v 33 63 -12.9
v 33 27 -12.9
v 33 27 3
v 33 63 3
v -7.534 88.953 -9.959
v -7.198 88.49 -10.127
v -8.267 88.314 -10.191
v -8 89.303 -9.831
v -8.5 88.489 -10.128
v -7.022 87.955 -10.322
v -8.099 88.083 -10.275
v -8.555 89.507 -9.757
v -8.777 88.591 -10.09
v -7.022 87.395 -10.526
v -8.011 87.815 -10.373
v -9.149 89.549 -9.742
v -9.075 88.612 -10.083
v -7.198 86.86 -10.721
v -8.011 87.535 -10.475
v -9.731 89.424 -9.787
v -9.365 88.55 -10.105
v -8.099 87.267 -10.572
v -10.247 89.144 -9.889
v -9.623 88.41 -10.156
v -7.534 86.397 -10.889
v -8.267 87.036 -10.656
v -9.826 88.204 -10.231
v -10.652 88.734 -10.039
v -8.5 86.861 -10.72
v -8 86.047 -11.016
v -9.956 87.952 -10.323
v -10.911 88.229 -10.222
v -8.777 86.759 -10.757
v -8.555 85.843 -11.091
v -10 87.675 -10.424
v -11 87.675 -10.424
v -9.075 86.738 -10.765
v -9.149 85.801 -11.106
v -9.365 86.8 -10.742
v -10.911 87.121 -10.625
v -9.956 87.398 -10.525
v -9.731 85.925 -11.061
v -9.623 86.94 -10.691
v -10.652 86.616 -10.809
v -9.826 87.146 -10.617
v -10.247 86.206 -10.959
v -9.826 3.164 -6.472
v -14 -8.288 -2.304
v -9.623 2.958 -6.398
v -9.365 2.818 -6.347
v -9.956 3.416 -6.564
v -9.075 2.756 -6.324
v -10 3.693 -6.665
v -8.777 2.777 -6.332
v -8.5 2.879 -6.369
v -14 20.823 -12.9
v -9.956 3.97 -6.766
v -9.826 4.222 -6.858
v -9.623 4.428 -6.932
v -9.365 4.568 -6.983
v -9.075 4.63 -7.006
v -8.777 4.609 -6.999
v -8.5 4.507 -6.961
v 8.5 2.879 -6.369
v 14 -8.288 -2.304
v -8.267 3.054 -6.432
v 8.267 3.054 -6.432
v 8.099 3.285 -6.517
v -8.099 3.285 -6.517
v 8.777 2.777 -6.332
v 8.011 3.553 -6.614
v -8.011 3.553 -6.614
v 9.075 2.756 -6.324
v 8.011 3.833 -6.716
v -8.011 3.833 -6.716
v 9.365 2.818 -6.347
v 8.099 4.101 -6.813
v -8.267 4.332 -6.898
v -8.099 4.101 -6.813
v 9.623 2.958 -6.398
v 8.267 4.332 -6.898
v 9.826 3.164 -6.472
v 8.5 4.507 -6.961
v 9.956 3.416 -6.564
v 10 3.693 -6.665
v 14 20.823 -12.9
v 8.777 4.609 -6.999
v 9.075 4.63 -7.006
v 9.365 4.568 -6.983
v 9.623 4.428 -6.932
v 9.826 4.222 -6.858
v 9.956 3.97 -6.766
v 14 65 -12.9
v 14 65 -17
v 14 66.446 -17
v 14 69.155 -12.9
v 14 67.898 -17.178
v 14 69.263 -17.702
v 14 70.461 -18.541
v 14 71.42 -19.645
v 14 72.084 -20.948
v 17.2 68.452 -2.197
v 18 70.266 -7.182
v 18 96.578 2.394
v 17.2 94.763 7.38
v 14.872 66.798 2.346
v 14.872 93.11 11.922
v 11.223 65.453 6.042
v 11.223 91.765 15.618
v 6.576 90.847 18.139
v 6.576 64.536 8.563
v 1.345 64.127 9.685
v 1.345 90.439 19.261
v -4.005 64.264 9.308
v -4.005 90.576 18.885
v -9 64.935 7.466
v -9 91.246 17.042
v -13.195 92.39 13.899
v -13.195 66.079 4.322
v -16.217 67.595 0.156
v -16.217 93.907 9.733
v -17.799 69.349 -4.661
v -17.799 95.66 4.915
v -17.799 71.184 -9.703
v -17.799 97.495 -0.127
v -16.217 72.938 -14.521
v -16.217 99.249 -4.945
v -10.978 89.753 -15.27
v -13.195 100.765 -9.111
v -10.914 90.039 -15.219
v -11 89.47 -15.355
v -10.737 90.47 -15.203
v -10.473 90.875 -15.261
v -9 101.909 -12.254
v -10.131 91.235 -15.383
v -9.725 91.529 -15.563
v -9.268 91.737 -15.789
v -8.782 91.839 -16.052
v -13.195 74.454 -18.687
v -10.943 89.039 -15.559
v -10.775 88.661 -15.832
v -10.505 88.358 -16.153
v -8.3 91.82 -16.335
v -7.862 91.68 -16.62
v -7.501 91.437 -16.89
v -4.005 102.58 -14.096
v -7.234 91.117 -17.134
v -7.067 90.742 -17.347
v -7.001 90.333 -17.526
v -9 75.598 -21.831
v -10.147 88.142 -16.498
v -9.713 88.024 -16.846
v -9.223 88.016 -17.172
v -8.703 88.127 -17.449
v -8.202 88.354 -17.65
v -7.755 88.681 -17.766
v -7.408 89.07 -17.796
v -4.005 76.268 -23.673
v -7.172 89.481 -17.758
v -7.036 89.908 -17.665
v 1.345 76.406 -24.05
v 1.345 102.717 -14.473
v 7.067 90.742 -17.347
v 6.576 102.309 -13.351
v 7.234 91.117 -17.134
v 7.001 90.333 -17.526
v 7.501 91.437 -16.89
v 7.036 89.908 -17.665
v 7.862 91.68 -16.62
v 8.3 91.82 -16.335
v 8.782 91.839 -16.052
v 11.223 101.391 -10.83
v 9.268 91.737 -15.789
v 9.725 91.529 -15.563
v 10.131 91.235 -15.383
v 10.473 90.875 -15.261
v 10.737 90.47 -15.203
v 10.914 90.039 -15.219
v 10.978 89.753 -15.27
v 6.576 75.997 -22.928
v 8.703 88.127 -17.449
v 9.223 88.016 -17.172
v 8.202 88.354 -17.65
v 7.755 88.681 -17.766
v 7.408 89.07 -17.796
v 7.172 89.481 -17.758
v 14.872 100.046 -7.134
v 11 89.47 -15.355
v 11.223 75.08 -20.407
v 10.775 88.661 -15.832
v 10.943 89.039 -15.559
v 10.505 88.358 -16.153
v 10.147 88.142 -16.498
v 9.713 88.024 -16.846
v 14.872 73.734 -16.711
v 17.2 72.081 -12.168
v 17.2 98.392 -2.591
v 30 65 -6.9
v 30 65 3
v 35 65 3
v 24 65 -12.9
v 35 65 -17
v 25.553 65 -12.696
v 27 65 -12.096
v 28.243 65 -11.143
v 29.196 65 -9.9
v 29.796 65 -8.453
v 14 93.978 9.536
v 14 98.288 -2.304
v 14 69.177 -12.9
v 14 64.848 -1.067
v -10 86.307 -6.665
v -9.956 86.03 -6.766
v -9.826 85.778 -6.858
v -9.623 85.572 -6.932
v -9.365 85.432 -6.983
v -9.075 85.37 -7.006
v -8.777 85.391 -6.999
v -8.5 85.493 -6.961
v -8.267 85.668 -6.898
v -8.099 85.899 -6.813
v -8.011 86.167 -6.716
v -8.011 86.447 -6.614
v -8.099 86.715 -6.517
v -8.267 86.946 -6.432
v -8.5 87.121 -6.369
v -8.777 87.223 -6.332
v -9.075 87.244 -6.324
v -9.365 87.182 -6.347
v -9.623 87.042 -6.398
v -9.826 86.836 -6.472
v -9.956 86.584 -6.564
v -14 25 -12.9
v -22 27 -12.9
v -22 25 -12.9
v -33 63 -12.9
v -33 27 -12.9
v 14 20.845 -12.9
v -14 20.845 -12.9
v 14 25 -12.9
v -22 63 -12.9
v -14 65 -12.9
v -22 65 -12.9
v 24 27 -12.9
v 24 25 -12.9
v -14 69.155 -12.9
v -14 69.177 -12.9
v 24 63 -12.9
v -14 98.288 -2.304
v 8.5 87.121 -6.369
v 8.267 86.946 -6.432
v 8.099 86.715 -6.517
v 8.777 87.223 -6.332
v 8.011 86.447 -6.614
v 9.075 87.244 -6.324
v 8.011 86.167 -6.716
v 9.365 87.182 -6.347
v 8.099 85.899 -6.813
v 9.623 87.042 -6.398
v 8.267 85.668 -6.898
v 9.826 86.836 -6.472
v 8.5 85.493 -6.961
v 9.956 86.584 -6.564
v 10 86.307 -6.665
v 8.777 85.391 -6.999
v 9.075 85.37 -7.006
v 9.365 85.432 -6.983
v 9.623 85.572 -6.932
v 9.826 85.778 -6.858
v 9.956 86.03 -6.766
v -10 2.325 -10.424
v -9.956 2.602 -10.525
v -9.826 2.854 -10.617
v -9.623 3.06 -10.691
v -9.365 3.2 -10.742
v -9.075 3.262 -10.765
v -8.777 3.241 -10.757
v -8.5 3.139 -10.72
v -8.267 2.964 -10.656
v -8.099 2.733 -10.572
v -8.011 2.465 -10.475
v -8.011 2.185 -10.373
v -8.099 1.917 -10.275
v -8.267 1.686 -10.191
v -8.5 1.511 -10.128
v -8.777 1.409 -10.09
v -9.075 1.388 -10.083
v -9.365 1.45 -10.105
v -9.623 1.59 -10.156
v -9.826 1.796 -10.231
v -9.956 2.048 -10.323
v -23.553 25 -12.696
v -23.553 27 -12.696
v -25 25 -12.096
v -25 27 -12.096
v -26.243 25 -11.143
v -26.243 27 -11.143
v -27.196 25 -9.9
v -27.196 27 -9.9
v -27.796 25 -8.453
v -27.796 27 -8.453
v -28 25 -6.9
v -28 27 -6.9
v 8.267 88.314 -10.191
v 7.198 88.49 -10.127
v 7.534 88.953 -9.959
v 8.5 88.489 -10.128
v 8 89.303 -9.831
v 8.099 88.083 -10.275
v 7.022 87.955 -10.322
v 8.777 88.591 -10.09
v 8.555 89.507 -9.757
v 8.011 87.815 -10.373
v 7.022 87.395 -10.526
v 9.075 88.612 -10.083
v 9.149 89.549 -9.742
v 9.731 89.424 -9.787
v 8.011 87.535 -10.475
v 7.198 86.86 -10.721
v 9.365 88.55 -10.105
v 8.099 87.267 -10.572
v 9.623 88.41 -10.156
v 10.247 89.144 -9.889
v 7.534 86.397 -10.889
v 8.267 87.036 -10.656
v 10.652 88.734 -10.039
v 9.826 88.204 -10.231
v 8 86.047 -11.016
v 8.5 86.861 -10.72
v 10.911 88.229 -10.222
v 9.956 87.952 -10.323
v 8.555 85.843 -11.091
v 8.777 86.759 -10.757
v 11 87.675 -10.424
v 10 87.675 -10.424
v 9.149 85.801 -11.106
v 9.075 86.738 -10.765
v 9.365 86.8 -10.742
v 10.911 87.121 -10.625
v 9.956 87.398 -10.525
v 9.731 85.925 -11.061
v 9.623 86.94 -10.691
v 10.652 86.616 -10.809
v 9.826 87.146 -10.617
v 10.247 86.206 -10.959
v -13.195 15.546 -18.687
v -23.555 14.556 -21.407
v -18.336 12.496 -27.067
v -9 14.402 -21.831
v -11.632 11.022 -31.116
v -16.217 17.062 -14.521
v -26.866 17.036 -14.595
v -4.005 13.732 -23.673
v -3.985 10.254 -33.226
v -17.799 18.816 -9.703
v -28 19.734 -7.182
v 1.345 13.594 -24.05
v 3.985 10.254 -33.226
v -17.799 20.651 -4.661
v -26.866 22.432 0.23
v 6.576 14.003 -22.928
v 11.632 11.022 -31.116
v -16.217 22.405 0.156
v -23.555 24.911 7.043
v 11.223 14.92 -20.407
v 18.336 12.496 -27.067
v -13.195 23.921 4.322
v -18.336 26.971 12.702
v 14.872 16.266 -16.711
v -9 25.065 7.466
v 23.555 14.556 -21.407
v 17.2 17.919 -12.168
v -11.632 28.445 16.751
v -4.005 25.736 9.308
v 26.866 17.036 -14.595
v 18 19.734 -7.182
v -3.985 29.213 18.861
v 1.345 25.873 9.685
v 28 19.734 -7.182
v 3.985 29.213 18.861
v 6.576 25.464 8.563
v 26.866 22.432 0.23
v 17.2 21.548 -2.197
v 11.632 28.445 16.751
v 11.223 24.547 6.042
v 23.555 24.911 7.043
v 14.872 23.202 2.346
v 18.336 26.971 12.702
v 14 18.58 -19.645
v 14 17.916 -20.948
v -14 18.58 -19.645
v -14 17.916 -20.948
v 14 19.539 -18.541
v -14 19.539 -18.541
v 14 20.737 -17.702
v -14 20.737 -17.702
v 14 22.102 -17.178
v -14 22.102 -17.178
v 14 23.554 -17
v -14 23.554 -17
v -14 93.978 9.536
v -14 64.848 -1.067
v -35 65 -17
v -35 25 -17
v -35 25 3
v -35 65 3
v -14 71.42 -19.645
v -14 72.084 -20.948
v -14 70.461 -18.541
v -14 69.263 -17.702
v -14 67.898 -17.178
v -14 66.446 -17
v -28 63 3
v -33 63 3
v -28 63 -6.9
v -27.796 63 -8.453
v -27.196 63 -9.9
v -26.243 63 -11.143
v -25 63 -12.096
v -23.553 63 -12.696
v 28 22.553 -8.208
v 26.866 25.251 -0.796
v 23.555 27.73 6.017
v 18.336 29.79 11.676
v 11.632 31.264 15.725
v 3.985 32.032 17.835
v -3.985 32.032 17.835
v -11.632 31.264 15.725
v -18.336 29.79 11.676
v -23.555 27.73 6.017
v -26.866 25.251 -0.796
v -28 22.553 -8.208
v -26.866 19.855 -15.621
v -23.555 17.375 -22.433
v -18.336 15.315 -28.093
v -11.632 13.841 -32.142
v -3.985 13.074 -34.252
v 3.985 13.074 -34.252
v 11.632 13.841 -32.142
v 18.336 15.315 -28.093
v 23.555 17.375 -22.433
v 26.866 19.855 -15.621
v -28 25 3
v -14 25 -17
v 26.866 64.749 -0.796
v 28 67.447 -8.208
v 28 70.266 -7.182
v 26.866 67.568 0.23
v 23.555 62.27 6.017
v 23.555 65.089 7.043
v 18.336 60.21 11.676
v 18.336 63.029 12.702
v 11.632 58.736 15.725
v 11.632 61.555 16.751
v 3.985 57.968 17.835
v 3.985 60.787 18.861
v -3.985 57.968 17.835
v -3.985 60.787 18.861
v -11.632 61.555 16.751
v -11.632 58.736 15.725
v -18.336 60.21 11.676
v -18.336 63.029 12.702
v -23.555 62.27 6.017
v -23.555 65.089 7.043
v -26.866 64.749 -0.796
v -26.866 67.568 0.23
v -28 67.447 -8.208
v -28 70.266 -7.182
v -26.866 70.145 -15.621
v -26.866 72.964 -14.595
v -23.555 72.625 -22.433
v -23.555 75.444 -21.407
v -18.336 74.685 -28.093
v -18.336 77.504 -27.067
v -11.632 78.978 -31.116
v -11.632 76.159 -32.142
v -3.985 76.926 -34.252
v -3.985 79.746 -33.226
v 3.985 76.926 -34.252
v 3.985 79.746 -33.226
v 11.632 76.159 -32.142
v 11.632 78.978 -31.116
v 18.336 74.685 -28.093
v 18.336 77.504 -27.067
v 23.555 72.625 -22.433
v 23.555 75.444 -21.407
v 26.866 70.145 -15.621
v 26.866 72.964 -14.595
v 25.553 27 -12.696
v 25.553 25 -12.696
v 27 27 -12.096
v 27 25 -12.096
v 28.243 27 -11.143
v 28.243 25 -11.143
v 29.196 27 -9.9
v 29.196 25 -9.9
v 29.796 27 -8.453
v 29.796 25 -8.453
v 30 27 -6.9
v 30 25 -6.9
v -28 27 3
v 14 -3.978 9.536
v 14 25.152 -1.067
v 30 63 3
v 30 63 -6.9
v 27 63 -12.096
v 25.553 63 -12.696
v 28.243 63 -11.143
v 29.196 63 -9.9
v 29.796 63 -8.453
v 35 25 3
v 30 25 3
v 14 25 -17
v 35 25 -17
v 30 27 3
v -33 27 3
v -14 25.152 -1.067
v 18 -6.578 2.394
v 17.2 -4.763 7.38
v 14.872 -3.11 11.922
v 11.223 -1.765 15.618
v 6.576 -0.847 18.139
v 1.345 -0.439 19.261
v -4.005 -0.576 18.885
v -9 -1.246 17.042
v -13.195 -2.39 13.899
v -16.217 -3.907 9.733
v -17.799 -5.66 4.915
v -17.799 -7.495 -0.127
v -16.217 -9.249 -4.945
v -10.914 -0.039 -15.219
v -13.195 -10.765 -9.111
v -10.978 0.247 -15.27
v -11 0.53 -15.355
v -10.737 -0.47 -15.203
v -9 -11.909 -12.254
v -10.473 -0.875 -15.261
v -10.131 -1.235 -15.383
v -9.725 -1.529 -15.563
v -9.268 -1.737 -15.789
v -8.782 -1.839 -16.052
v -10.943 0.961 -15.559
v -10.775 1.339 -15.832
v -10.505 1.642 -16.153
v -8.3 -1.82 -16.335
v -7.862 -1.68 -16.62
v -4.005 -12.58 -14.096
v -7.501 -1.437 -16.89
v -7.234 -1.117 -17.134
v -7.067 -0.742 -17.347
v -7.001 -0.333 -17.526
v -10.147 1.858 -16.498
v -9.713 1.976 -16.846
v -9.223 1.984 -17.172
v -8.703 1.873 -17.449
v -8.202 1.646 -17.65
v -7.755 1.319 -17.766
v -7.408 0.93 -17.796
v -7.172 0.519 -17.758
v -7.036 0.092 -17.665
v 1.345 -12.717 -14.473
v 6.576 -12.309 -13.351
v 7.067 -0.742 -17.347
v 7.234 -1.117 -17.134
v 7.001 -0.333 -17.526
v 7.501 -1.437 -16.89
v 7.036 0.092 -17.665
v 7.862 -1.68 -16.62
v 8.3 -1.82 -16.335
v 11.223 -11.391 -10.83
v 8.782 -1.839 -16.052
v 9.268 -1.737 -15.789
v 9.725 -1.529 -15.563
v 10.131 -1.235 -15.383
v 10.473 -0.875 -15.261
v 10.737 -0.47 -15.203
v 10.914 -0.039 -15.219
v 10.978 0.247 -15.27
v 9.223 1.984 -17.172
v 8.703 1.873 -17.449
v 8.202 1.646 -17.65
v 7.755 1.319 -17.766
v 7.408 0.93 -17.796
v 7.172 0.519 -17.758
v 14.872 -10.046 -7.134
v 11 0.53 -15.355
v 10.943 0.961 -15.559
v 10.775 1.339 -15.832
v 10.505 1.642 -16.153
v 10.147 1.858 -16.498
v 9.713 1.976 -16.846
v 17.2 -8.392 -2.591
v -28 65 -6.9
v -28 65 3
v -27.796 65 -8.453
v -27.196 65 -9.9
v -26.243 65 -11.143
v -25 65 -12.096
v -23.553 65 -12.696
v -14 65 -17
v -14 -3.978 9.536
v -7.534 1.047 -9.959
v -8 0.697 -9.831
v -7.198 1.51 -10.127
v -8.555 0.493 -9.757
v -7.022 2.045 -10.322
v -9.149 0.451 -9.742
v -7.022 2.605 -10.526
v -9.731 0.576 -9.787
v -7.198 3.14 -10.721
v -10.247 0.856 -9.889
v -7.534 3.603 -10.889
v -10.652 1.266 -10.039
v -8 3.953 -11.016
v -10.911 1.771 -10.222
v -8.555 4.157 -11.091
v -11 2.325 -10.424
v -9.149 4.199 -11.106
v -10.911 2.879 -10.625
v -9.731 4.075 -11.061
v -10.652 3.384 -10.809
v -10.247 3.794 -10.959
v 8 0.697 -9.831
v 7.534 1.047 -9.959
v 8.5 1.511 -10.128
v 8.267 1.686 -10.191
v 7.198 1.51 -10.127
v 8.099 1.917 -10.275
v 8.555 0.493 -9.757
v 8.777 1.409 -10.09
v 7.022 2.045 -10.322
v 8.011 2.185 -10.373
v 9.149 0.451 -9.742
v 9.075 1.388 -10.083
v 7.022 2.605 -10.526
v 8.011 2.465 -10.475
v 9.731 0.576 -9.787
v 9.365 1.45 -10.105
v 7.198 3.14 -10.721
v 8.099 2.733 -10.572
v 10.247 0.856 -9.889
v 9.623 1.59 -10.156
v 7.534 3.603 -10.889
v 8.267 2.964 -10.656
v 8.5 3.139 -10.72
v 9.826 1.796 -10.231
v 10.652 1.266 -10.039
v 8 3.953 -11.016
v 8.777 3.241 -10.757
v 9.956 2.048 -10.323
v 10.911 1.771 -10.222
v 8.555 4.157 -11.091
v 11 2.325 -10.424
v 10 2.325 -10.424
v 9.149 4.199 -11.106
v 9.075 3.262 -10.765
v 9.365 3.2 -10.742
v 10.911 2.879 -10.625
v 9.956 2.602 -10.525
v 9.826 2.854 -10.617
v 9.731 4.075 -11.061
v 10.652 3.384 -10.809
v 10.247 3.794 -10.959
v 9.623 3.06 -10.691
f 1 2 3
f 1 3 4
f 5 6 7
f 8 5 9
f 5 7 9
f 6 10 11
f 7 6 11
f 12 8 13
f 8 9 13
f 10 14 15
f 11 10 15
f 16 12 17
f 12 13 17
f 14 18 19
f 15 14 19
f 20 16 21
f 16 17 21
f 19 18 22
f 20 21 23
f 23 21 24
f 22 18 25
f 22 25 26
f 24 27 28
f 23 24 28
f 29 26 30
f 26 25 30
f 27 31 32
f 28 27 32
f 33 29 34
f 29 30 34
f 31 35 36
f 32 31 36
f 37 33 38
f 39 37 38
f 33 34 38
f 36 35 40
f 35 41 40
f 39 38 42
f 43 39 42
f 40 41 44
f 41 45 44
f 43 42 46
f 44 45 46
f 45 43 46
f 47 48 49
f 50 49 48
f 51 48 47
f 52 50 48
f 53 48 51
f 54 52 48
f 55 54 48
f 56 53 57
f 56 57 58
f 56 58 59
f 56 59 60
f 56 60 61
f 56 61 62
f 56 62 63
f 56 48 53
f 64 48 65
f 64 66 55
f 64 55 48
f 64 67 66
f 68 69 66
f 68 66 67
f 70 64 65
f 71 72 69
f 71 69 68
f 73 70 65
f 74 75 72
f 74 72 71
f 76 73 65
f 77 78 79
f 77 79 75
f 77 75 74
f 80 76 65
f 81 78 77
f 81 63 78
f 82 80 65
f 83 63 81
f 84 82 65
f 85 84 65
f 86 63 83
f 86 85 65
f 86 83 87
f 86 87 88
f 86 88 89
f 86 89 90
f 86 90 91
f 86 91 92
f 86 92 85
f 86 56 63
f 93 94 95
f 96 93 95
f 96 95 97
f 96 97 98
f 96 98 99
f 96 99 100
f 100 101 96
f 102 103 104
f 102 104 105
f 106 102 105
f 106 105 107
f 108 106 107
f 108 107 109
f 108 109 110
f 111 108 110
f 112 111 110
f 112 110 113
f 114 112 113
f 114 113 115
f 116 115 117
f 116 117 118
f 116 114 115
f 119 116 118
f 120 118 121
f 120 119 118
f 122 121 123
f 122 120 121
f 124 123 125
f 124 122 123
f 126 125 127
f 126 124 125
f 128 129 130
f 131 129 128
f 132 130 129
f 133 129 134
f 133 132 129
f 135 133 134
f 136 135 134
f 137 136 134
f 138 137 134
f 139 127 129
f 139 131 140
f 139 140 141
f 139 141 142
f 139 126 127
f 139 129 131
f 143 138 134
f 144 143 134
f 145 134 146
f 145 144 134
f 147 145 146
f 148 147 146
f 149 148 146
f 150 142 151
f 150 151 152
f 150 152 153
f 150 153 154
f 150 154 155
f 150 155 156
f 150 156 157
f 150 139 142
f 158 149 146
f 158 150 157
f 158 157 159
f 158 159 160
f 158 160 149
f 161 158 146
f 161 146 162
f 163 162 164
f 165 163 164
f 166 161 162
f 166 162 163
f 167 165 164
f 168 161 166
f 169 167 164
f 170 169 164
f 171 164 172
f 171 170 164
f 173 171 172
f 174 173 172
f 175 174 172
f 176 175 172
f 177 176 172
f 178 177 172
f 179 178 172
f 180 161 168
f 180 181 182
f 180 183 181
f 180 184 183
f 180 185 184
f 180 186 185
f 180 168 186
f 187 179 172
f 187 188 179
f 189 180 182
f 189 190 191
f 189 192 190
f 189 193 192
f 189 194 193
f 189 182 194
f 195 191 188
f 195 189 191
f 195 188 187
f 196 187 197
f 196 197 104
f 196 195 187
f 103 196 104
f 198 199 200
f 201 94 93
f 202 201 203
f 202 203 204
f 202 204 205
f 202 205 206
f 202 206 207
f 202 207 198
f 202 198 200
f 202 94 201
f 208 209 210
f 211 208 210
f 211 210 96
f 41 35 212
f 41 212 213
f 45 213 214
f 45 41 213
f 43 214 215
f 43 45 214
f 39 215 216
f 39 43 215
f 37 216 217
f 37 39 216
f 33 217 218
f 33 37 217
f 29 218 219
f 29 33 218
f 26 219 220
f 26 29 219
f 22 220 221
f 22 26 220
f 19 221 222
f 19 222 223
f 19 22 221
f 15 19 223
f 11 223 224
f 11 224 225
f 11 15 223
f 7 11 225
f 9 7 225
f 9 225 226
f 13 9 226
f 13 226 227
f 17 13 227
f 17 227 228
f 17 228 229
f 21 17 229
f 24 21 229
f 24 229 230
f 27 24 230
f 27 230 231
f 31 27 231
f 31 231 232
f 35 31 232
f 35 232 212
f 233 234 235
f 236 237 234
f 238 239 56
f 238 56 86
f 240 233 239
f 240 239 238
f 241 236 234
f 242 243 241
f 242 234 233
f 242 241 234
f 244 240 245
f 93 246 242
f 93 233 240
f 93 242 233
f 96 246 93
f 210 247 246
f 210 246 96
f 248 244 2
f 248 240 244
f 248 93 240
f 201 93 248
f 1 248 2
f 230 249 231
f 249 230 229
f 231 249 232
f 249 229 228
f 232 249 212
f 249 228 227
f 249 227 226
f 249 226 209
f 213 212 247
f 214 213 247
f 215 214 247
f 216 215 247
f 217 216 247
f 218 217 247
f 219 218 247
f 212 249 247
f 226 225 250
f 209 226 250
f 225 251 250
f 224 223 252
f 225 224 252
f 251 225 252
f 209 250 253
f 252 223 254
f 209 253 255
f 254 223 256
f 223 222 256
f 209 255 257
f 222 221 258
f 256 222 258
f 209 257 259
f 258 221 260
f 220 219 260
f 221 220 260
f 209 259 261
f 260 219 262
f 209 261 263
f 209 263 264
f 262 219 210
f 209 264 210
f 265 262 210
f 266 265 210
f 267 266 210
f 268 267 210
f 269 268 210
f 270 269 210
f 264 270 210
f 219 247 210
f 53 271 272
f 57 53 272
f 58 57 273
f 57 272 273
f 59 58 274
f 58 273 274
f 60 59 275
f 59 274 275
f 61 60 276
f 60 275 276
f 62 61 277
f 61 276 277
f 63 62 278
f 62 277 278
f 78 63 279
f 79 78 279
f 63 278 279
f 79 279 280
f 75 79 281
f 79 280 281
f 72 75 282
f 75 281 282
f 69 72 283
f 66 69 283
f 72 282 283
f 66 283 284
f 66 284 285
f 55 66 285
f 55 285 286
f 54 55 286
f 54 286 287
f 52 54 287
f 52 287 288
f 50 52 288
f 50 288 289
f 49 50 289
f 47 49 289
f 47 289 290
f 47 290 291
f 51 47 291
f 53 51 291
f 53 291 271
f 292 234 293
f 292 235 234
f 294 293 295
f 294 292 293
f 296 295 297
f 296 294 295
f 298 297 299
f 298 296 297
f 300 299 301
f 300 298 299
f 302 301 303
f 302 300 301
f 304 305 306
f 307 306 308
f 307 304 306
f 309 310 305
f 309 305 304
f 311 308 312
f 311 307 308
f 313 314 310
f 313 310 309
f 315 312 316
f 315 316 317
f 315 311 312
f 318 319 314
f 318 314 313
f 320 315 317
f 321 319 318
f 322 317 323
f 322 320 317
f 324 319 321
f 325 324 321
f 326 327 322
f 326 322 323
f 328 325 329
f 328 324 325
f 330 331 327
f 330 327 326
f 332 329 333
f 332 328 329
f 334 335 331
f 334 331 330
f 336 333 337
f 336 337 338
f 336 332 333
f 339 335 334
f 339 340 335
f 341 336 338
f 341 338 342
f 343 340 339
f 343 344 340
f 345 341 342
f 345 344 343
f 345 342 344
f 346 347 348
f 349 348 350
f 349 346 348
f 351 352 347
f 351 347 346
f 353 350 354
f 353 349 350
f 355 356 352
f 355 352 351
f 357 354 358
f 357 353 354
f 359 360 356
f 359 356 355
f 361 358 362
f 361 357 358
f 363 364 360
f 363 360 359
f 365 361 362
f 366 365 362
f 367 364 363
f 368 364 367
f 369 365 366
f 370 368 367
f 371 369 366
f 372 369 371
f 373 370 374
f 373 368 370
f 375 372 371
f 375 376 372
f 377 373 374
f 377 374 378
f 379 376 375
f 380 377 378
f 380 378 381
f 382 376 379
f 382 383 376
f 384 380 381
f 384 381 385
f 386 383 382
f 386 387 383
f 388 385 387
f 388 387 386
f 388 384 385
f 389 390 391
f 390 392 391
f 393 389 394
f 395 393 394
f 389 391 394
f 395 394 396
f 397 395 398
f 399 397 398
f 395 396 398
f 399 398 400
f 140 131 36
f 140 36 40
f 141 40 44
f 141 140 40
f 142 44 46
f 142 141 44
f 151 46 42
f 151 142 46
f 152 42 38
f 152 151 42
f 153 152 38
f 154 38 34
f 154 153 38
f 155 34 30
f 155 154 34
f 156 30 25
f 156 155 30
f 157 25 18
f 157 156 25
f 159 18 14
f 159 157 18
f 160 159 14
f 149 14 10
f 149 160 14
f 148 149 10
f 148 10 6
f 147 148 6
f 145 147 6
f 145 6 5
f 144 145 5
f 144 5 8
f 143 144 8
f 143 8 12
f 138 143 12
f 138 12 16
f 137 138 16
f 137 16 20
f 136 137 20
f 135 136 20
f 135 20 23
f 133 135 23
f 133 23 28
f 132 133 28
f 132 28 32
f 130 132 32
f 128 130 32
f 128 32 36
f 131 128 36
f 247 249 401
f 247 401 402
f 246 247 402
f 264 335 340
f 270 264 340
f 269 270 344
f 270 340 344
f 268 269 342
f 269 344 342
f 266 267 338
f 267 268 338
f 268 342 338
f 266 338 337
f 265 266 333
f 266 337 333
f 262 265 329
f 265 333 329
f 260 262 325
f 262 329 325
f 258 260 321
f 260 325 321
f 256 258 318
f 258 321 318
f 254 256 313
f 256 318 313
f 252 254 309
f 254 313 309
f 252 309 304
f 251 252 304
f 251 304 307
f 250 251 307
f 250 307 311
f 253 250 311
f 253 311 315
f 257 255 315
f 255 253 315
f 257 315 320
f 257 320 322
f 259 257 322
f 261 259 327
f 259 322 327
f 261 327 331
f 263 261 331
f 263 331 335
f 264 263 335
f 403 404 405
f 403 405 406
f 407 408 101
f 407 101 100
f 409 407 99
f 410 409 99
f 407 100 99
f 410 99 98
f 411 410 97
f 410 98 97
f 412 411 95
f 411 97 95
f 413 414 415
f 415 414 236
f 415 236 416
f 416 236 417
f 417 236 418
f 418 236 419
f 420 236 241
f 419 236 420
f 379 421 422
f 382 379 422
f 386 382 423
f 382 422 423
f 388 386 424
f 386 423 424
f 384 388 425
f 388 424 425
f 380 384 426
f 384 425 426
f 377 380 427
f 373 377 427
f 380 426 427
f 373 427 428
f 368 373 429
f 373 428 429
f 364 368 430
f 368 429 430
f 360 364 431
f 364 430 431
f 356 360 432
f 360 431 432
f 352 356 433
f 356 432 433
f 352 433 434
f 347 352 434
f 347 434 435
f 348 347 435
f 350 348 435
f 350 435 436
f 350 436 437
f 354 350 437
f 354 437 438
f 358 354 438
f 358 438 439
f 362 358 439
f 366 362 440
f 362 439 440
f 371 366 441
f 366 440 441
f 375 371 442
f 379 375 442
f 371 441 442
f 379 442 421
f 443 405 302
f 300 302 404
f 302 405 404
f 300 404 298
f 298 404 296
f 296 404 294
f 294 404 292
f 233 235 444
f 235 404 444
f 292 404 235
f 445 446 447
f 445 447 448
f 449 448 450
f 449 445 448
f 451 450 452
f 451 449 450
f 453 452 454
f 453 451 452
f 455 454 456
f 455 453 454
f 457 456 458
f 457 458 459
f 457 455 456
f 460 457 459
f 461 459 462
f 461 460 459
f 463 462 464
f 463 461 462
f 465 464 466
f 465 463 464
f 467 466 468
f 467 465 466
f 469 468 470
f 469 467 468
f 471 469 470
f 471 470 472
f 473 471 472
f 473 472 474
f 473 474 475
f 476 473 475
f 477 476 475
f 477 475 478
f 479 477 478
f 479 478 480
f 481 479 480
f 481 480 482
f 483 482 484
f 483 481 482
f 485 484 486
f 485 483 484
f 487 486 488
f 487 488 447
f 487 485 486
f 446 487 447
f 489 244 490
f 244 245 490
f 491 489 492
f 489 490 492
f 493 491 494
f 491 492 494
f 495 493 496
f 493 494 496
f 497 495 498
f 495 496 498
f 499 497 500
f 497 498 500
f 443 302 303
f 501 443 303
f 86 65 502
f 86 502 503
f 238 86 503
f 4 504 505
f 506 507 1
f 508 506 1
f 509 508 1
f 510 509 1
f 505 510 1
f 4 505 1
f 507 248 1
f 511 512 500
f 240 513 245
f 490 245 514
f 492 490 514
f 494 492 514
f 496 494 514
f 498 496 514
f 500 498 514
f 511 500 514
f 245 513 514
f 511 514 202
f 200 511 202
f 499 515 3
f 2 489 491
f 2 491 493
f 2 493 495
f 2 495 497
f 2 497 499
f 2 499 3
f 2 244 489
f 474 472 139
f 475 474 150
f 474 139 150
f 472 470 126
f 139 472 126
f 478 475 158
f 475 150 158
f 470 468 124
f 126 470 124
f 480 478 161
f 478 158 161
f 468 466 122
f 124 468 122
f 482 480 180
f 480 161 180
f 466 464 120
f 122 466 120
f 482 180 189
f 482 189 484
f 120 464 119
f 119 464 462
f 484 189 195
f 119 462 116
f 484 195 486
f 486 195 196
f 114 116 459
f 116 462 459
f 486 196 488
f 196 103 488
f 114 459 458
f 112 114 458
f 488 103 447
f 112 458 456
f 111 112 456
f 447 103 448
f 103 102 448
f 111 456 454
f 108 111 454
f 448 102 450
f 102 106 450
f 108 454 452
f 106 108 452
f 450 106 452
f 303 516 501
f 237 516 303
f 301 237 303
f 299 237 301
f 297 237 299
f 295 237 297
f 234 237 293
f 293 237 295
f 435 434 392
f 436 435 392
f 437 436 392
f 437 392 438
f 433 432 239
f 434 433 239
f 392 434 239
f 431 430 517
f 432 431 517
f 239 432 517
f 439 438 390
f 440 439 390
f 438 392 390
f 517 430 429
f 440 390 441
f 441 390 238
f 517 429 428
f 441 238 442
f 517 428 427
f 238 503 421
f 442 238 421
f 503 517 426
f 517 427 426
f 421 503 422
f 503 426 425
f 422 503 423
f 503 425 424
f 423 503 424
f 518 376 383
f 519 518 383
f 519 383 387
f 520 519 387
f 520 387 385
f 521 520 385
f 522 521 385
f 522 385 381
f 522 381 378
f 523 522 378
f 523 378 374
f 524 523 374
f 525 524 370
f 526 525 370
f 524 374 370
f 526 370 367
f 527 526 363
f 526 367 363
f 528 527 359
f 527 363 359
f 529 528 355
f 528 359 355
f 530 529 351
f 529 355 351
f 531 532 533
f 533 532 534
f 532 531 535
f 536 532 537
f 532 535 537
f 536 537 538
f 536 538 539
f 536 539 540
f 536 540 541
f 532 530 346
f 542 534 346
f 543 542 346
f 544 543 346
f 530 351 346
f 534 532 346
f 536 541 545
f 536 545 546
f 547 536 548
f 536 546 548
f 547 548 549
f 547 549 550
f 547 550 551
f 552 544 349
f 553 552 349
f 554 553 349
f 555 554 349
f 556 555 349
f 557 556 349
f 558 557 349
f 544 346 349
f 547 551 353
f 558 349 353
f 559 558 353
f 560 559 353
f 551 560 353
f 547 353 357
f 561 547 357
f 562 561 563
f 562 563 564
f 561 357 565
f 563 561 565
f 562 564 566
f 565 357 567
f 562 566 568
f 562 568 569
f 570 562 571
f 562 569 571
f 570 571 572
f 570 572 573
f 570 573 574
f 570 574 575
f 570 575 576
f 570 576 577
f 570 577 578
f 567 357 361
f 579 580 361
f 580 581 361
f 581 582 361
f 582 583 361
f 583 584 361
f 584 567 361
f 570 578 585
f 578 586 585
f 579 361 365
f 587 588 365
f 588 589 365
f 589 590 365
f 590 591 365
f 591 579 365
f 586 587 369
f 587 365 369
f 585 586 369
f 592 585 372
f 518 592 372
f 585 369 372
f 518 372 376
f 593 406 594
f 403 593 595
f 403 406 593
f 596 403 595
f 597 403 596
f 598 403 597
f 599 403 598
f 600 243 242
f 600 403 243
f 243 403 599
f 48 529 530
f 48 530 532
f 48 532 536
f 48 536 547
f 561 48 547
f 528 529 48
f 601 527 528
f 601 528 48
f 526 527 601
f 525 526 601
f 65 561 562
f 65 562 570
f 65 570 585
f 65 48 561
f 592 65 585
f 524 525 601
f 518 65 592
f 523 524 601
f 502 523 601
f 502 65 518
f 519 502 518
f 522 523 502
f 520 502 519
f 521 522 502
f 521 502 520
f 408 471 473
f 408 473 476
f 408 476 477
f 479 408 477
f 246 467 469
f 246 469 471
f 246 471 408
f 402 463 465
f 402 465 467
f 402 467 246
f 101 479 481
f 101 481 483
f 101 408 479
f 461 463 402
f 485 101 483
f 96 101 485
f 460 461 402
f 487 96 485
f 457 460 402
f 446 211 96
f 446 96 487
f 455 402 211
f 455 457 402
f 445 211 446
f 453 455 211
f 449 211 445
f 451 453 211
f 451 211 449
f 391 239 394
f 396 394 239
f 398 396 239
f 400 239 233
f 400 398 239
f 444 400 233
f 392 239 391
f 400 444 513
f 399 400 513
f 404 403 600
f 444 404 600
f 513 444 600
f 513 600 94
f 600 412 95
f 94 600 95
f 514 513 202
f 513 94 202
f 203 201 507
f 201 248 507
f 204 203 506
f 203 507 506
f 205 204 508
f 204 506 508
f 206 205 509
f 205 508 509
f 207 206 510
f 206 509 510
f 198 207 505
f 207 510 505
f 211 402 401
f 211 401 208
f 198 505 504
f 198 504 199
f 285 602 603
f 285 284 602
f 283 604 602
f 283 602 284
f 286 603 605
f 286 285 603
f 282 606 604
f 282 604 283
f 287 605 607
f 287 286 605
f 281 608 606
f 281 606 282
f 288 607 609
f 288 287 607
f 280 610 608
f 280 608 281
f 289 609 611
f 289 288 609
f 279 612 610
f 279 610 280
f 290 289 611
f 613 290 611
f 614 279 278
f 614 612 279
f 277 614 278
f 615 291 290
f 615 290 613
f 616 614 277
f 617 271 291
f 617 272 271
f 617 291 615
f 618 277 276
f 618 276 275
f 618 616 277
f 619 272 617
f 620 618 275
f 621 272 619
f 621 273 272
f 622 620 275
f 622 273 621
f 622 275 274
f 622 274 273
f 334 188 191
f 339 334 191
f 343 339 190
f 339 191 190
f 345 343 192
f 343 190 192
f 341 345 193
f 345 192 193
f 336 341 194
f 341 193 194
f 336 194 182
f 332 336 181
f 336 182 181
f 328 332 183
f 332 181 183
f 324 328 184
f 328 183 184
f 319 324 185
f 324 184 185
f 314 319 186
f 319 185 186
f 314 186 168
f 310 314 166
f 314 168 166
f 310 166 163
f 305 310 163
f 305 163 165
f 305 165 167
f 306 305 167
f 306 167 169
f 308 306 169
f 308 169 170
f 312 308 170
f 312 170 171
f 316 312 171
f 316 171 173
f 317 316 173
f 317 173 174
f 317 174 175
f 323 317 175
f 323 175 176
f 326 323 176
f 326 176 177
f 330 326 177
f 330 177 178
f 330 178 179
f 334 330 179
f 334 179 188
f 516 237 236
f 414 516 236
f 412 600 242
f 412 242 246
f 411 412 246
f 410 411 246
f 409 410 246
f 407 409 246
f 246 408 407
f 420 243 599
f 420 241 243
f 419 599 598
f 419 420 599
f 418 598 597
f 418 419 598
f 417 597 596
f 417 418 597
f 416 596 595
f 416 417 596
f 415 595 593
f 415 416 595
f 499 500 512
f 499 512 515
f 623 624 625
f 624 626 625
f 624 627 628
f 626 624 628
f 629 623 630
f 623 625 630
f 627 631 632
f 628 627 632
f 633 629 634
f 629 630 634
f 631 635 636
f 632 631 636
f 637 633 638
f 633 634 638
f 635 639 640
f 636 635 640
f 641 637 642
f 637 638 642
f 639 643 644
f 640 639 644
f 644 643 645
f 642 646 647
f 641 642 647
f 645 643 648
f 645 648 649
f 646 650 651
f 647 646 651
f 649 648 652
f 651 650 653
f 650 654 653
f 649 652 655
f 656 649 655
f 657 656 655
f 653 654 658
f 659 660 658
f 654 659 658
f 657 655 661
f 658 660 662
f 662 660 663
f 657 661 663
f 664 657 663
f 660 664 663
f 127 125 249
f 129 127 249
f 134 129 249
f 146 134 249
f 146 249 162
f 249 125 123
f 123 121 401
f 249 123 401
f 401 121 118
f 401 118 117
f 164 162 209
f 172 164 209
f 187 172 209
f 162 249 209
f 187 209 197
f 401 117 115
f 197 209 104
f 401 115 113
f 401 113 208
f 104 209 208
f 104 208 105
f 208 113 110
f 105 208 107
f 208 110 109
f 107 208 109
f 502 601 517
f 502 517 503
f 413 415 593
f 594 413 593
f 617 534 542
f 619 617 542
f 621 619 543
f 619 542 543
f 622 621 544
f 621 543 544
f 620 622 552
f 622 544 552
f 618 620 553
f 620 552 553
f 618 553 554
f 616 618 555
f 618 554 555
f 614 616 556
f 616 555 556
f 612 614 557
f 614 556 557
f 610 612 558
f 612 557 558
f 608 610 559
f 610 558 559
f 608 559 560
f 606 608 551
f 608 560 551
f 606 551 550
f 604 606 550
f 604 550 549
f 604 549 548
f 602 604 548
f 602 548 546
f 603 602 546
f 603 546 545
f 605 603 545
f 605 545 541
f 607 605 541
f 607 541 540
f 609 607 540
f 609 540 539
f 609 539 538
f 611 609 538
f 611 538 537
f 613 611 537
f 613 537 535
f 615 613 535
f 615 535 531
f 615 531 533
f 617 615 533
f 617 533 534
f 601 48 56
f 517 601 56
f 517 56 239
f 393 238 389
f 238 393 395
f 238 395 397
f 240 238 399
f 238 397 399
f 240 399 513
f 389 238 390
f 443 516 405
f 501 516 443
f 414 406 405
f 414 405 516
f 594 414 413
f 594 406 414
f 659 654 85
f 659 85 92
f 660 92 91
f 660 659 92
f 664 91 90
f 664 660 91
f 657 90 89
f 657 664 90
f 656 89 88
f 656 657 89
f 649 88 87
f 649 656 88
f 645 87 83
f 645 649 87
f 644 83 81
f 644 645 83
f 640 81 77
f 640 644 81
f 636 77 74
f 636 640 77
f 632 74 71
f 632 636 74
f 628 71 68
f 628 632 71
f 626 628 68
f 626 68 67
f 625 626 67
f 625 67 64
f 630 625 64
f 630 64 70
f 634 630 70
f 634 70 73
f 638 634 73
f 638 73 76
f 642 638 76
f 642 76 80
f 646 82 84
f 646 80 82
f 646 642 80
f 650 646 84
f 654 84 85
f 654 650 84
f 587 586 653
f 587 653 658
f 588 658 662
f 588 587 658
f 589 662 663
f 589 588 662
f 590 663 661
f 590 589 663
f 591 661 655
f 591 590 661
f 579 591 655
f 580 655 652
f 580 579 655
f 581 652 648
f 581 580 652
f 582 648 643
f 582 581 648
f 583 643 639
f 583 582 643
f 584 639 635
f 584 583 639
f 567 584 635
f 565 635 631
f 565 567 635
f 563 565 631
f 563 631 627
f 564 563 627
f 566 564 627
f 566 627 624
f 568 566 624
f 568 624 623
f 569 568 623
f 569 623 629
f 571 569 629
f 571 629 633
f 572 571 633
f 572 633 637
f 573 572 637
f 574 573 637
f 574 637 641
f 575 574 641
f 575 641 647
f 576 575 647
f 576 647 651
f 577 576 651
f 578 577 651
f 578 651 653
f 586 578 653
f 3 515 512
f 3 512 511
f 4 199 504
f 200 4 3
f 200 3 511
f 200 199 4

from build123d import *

# Parameters (mm, degrees)
BOX005_W               = 66
BOX005_H               = 36
BOX005_DEPTH           = 20
BOX006_W               = 58
BOX006_H               = 40
BOX006_DEPTH           = 20
BOX004_W               = 70
BOX004_H               = 40
BOX004_DEPTH           = 20
BOX002_W               = 28
BOX002_H               = 58
BOX002_DEPTH           = 4.1
BOX003_W               = 70
BOX003_H               = 40
BOX003_DEPTH           = 4.1
CYLINDER007_R          = 1
CYLINDER007_DEPTH      = 36
CYLINDER006_R          = 2
CYLINDER006_DEPTH      = 36
BOX_W                  = 16
BOX_H                  = 26
BOX_DEPTH              = 12
FILLET006_R            = 1
BOX001_W               = 28
BOX001_H               = 51
BOX001_DEPTH           = 12.6
CYLINDER005_R          = 18
CYLINDER005_DEPTH      = 31
CYLINDER005_ROLL_ANGLE = 90.0000000001
CYLINDER008_R          = 18
CYLINDER008_DEPTH      = 3
CYLINDER008_ROLL_ANGLE = 90.0000000001
CYLINDER009_R          = 28
CYLINDER009_DEPTH      = 3
CYLINDER009_ROLL_ANGLE = 90.0000000001
FUSION005_ROLL_ANGLE   = -20
FILLET_R               = 6
FILLET008_R            = 6


with BuildPart() as cubo005:
    # Box005 → Box005 (new body)
    with BuildSketch(Plane(origin=(-33, 27, -17), x_dir=(1, 0, 0), z_dir=(0, 0, 1))):
        with Locations((33, 18)):
            Rectangle(BOX005_W, BOX005_H)
    extrude(amount=BOX005_DEPTH)


with BuildPart() as fusion006:
    # Box006 → Box006 (new body)
    with BuildSketch(Plane(origin=(-28, 25, -17), x_dir=(1, 0, 0), z_dir=(0, 0, 1))):
        with Locations((29, 20)):
            Rectangle(BOX006_W, BOX006_H)
    extrude(amount=BOX006_DEPTH)

    # Fusion006: union Cubo005
    add(cubo005.part)


with BuildPart() as cut009:
    # Box004 → Box004 (new body)
    with BuildSketch(Plane(origin=(-35, 25, -17), x_dir=(1, 0, 0), z_dir=(0, 0, 1))):
        with Locations((35, 20)):
            Rectangle(BOX004_W, BOX004_H)
    extrude(amount=BOX004_DEPTH)

    # Cut009: cut Fusion006
    add(fusion006.part, mode=Mode.SUBTRACT)


with BuildPart() as cubo002:
    # Box002 → Box002 (new body)
    with BuildSketch(Plane(origin=(-14, 16, -17), x_dir=(1, 0, 0), z_dir=(0, 0, 1))):
        with Locations((14, 29)):
            Rectangle(BOX002_W, BOX002_H)
    extrude(amount=BOX002_DEPTH)


with BuildPart() as fusion007:
    # Box003 → Box003 (new body)
    with BuildSketch(Plane(origin=(-35, 25, -17), x_dir=(1, 0, 0), z_dir=(0, 0, 1))):
        with Locations((35, 20)):
            Rectangle(BOX003_W, BOX003_H)
    extrude(amount=BOX003_DEPTH)

    # Fusion007: union Cut009, Cubo002
    add(cut009.part)
    add(cubo002.part)


with BuildPart() as cilindro007:
    # Cylinder007 → Cylinder007 (new body)
    with BuildSketch(Plane(origin=(9, 5.75, -40), x_dir=(1, 0, 0), z_dir=(0, 0, 1))):
        Circle(CYLINDER007_R)
    extrude(amount=CYLINDER007_DEPTH)


with BuildPart() as fusion003:
    # Cylinder006 → Cylinder006 (new body)
    with BuildSketch(Plane(origin=(9, 5.75, -45), x_dir=(1, 0, 0), z_dir=(0, 0, 1))):
        Circle(CYLINDER006_R)
    extrude(amount=CYLINDER006_DEPTH)

    # Fusion003: union Cilindro007
    add(cilindro007.part)


with BuildPart() as fusion004:
    # Part__Mirroring: instance of Fusion003
    add(fusion003.part.mirror(Plane(origin=(0, 0, 0), x_dir=(0, -1, 0), z_dir=(1, 0, 0))))

    # Fusion004: union Fusion003
    add(fusion003.part)


with BuildPart() as fillet006:
    # Box → Box (new body)
    with BuildSketch(Plane(origin=(-8, -8, -5), x_dir=(1, 0, 0), z_dir=(0, 0, 1))):
        with Locations((8, 13)):
            Rectangle(BOX_W, BOX_H)
    extrude(amount=BOX_DEPTH)

    # Fillet006
    fillet006_edges = [fillet006.edges().sort_by_distance(p)[0] for p in [
        (-8, 5, 7),
        (8, 5, 7),
    ]]
    fillet(fillet006_edges, radius=FILLET006_R)


with BuildPart() as fusion002:
    # Box001 → Box001 (new body)
    with BuildSketch(Plane(origin=(-14, -12, -5), x_dir=(1, 0, 0), z_dir=(0, 0, 1))):
        with Locations((14, 25.5)):
            Rectangle(BOX001_W, BOX001_H)
    extrude(amount=BOX001_DEPTH)

    # Fusion002: union Fillet006
    add(fillet006.part)


with BuildPart() as cut004:
    # Cylinder005 → Cylinder005 (new body)
    with BuildSketch(Plane.XY):
        Circle(CYLINDER005_R)
    extrude(amount=CYLINDER005_DEPTH)


with BuildPart() as cut004_1:
    # Cylinder005 roll: moved
    add(cut004.part.rotate(Axis((0, 0, 0), (1, 0, 0)), CYLINDER005_ROLL_ANGLE))


with BuildPart() as cut004_2:
    # Cylinder005 placement: moved
    add(cut004_1.part.moved(Location((0, 24, 0))))

    # Cut003: cut Fusion002
    add(fusion002.part, mode=Mode.SUBTRACT)

    # Cut004: cut Fusion004
    add(fusion004.part, mode=Mode.SUBTRACT)


with BuildPart() as cilindro008:
    # Cylinder008 → Cylinder008 (new body)
    with BuildSketch(Plane.XY):
        Circle(CYLINDER008_R)
    extrude(amount=CYLINDER008_DEPTH)


with BuildPart() as cilindro008_1:
    # Cylinder008 roll: moved
    add(cilindro008.part.rotate(Axis((0, 0, 0), (1, 0, 0)), CYLINDER008_ROLL_ANGLE))


with BuildPart() as cilindro008_2:
    # Cylinder008 placement: moved
    add(cilindro008_1.part.moved(Location((0, 24, 0))))


with BuildPart() as fusion005:
    # Cylinder009 → Cylinder009 (new body)
    with BuildSketch(Plane.XY):
        Circle(CYLINDER009_R)
    extrude(amount=CYLINDER009_DEPTH)


with BuildPart() as fusion005_1:
    # Cylinder009 roll: moved
    add(fusion005.part.rotate(Axis((0, 0, 0), (1, 0, 0)), CYLINDER009_ROLL_ANGLE))


with BuildPart() as fusion005_2:
    # Cylinder009 placement: moved
    add(fusion005_1.part.moved(Location((0, 24, 0))))

    # Cut005: cut Cilindro008
    add(cilindro008_2.part, mode=Mode.SUBTRACT)

    # Fusion005: union Cut004
    add(cut004_2.part)


with BuildPart() as fusion005_3:
    # Fusion005 roll: moved
    add(fusion005_2.part.rotate(Axis((0, 0, 0), (1, 0, 0)), FUSION005_ROLL_ANGLE))


with BuildPart() as fusion005_4:
    # Fusion005 placement: moved
    add(fusion005_3.part)


with BuildPart() as part_mirroring004:
    # Part__Mirroring004: instance of Fusion005
    add(fusion005_4.part.mirror(Plane(origin=(0, 45, 0), x_dir=(1, 0, 0), z_dir=(0, 1, 0))))


with BuildPart() as fillet008:
    # Fusion008 base: copy of Fusion005
    add(fusion005_4.part)

    # Fusion008: union Fusion007, Part__Mirroring004
    add(fusion007.part)
    add(part_mirroring004.part)

    # Fillet
    fillet_edges = [fillet008.edges().sort_by_distance(p)[0] for p in [
        (0, 19.352773, -17),
        (0, 70.647227, -17),
    ]]
    fillet(fillet_edges, radius=FILLET_R)

    # Fillet008
    fillet008_edges = [fillet008.edges().sort_by_distance(p)[0] for p in [
        (-28, 26, -12.9),
        (-28, 64, -12.9),
        (30, 64, -12.9),
        (30, 26, -12.9),
    ]]
    fillet(fillet008_edges, radius=FILLET008_R)


solid = fillet008.part
